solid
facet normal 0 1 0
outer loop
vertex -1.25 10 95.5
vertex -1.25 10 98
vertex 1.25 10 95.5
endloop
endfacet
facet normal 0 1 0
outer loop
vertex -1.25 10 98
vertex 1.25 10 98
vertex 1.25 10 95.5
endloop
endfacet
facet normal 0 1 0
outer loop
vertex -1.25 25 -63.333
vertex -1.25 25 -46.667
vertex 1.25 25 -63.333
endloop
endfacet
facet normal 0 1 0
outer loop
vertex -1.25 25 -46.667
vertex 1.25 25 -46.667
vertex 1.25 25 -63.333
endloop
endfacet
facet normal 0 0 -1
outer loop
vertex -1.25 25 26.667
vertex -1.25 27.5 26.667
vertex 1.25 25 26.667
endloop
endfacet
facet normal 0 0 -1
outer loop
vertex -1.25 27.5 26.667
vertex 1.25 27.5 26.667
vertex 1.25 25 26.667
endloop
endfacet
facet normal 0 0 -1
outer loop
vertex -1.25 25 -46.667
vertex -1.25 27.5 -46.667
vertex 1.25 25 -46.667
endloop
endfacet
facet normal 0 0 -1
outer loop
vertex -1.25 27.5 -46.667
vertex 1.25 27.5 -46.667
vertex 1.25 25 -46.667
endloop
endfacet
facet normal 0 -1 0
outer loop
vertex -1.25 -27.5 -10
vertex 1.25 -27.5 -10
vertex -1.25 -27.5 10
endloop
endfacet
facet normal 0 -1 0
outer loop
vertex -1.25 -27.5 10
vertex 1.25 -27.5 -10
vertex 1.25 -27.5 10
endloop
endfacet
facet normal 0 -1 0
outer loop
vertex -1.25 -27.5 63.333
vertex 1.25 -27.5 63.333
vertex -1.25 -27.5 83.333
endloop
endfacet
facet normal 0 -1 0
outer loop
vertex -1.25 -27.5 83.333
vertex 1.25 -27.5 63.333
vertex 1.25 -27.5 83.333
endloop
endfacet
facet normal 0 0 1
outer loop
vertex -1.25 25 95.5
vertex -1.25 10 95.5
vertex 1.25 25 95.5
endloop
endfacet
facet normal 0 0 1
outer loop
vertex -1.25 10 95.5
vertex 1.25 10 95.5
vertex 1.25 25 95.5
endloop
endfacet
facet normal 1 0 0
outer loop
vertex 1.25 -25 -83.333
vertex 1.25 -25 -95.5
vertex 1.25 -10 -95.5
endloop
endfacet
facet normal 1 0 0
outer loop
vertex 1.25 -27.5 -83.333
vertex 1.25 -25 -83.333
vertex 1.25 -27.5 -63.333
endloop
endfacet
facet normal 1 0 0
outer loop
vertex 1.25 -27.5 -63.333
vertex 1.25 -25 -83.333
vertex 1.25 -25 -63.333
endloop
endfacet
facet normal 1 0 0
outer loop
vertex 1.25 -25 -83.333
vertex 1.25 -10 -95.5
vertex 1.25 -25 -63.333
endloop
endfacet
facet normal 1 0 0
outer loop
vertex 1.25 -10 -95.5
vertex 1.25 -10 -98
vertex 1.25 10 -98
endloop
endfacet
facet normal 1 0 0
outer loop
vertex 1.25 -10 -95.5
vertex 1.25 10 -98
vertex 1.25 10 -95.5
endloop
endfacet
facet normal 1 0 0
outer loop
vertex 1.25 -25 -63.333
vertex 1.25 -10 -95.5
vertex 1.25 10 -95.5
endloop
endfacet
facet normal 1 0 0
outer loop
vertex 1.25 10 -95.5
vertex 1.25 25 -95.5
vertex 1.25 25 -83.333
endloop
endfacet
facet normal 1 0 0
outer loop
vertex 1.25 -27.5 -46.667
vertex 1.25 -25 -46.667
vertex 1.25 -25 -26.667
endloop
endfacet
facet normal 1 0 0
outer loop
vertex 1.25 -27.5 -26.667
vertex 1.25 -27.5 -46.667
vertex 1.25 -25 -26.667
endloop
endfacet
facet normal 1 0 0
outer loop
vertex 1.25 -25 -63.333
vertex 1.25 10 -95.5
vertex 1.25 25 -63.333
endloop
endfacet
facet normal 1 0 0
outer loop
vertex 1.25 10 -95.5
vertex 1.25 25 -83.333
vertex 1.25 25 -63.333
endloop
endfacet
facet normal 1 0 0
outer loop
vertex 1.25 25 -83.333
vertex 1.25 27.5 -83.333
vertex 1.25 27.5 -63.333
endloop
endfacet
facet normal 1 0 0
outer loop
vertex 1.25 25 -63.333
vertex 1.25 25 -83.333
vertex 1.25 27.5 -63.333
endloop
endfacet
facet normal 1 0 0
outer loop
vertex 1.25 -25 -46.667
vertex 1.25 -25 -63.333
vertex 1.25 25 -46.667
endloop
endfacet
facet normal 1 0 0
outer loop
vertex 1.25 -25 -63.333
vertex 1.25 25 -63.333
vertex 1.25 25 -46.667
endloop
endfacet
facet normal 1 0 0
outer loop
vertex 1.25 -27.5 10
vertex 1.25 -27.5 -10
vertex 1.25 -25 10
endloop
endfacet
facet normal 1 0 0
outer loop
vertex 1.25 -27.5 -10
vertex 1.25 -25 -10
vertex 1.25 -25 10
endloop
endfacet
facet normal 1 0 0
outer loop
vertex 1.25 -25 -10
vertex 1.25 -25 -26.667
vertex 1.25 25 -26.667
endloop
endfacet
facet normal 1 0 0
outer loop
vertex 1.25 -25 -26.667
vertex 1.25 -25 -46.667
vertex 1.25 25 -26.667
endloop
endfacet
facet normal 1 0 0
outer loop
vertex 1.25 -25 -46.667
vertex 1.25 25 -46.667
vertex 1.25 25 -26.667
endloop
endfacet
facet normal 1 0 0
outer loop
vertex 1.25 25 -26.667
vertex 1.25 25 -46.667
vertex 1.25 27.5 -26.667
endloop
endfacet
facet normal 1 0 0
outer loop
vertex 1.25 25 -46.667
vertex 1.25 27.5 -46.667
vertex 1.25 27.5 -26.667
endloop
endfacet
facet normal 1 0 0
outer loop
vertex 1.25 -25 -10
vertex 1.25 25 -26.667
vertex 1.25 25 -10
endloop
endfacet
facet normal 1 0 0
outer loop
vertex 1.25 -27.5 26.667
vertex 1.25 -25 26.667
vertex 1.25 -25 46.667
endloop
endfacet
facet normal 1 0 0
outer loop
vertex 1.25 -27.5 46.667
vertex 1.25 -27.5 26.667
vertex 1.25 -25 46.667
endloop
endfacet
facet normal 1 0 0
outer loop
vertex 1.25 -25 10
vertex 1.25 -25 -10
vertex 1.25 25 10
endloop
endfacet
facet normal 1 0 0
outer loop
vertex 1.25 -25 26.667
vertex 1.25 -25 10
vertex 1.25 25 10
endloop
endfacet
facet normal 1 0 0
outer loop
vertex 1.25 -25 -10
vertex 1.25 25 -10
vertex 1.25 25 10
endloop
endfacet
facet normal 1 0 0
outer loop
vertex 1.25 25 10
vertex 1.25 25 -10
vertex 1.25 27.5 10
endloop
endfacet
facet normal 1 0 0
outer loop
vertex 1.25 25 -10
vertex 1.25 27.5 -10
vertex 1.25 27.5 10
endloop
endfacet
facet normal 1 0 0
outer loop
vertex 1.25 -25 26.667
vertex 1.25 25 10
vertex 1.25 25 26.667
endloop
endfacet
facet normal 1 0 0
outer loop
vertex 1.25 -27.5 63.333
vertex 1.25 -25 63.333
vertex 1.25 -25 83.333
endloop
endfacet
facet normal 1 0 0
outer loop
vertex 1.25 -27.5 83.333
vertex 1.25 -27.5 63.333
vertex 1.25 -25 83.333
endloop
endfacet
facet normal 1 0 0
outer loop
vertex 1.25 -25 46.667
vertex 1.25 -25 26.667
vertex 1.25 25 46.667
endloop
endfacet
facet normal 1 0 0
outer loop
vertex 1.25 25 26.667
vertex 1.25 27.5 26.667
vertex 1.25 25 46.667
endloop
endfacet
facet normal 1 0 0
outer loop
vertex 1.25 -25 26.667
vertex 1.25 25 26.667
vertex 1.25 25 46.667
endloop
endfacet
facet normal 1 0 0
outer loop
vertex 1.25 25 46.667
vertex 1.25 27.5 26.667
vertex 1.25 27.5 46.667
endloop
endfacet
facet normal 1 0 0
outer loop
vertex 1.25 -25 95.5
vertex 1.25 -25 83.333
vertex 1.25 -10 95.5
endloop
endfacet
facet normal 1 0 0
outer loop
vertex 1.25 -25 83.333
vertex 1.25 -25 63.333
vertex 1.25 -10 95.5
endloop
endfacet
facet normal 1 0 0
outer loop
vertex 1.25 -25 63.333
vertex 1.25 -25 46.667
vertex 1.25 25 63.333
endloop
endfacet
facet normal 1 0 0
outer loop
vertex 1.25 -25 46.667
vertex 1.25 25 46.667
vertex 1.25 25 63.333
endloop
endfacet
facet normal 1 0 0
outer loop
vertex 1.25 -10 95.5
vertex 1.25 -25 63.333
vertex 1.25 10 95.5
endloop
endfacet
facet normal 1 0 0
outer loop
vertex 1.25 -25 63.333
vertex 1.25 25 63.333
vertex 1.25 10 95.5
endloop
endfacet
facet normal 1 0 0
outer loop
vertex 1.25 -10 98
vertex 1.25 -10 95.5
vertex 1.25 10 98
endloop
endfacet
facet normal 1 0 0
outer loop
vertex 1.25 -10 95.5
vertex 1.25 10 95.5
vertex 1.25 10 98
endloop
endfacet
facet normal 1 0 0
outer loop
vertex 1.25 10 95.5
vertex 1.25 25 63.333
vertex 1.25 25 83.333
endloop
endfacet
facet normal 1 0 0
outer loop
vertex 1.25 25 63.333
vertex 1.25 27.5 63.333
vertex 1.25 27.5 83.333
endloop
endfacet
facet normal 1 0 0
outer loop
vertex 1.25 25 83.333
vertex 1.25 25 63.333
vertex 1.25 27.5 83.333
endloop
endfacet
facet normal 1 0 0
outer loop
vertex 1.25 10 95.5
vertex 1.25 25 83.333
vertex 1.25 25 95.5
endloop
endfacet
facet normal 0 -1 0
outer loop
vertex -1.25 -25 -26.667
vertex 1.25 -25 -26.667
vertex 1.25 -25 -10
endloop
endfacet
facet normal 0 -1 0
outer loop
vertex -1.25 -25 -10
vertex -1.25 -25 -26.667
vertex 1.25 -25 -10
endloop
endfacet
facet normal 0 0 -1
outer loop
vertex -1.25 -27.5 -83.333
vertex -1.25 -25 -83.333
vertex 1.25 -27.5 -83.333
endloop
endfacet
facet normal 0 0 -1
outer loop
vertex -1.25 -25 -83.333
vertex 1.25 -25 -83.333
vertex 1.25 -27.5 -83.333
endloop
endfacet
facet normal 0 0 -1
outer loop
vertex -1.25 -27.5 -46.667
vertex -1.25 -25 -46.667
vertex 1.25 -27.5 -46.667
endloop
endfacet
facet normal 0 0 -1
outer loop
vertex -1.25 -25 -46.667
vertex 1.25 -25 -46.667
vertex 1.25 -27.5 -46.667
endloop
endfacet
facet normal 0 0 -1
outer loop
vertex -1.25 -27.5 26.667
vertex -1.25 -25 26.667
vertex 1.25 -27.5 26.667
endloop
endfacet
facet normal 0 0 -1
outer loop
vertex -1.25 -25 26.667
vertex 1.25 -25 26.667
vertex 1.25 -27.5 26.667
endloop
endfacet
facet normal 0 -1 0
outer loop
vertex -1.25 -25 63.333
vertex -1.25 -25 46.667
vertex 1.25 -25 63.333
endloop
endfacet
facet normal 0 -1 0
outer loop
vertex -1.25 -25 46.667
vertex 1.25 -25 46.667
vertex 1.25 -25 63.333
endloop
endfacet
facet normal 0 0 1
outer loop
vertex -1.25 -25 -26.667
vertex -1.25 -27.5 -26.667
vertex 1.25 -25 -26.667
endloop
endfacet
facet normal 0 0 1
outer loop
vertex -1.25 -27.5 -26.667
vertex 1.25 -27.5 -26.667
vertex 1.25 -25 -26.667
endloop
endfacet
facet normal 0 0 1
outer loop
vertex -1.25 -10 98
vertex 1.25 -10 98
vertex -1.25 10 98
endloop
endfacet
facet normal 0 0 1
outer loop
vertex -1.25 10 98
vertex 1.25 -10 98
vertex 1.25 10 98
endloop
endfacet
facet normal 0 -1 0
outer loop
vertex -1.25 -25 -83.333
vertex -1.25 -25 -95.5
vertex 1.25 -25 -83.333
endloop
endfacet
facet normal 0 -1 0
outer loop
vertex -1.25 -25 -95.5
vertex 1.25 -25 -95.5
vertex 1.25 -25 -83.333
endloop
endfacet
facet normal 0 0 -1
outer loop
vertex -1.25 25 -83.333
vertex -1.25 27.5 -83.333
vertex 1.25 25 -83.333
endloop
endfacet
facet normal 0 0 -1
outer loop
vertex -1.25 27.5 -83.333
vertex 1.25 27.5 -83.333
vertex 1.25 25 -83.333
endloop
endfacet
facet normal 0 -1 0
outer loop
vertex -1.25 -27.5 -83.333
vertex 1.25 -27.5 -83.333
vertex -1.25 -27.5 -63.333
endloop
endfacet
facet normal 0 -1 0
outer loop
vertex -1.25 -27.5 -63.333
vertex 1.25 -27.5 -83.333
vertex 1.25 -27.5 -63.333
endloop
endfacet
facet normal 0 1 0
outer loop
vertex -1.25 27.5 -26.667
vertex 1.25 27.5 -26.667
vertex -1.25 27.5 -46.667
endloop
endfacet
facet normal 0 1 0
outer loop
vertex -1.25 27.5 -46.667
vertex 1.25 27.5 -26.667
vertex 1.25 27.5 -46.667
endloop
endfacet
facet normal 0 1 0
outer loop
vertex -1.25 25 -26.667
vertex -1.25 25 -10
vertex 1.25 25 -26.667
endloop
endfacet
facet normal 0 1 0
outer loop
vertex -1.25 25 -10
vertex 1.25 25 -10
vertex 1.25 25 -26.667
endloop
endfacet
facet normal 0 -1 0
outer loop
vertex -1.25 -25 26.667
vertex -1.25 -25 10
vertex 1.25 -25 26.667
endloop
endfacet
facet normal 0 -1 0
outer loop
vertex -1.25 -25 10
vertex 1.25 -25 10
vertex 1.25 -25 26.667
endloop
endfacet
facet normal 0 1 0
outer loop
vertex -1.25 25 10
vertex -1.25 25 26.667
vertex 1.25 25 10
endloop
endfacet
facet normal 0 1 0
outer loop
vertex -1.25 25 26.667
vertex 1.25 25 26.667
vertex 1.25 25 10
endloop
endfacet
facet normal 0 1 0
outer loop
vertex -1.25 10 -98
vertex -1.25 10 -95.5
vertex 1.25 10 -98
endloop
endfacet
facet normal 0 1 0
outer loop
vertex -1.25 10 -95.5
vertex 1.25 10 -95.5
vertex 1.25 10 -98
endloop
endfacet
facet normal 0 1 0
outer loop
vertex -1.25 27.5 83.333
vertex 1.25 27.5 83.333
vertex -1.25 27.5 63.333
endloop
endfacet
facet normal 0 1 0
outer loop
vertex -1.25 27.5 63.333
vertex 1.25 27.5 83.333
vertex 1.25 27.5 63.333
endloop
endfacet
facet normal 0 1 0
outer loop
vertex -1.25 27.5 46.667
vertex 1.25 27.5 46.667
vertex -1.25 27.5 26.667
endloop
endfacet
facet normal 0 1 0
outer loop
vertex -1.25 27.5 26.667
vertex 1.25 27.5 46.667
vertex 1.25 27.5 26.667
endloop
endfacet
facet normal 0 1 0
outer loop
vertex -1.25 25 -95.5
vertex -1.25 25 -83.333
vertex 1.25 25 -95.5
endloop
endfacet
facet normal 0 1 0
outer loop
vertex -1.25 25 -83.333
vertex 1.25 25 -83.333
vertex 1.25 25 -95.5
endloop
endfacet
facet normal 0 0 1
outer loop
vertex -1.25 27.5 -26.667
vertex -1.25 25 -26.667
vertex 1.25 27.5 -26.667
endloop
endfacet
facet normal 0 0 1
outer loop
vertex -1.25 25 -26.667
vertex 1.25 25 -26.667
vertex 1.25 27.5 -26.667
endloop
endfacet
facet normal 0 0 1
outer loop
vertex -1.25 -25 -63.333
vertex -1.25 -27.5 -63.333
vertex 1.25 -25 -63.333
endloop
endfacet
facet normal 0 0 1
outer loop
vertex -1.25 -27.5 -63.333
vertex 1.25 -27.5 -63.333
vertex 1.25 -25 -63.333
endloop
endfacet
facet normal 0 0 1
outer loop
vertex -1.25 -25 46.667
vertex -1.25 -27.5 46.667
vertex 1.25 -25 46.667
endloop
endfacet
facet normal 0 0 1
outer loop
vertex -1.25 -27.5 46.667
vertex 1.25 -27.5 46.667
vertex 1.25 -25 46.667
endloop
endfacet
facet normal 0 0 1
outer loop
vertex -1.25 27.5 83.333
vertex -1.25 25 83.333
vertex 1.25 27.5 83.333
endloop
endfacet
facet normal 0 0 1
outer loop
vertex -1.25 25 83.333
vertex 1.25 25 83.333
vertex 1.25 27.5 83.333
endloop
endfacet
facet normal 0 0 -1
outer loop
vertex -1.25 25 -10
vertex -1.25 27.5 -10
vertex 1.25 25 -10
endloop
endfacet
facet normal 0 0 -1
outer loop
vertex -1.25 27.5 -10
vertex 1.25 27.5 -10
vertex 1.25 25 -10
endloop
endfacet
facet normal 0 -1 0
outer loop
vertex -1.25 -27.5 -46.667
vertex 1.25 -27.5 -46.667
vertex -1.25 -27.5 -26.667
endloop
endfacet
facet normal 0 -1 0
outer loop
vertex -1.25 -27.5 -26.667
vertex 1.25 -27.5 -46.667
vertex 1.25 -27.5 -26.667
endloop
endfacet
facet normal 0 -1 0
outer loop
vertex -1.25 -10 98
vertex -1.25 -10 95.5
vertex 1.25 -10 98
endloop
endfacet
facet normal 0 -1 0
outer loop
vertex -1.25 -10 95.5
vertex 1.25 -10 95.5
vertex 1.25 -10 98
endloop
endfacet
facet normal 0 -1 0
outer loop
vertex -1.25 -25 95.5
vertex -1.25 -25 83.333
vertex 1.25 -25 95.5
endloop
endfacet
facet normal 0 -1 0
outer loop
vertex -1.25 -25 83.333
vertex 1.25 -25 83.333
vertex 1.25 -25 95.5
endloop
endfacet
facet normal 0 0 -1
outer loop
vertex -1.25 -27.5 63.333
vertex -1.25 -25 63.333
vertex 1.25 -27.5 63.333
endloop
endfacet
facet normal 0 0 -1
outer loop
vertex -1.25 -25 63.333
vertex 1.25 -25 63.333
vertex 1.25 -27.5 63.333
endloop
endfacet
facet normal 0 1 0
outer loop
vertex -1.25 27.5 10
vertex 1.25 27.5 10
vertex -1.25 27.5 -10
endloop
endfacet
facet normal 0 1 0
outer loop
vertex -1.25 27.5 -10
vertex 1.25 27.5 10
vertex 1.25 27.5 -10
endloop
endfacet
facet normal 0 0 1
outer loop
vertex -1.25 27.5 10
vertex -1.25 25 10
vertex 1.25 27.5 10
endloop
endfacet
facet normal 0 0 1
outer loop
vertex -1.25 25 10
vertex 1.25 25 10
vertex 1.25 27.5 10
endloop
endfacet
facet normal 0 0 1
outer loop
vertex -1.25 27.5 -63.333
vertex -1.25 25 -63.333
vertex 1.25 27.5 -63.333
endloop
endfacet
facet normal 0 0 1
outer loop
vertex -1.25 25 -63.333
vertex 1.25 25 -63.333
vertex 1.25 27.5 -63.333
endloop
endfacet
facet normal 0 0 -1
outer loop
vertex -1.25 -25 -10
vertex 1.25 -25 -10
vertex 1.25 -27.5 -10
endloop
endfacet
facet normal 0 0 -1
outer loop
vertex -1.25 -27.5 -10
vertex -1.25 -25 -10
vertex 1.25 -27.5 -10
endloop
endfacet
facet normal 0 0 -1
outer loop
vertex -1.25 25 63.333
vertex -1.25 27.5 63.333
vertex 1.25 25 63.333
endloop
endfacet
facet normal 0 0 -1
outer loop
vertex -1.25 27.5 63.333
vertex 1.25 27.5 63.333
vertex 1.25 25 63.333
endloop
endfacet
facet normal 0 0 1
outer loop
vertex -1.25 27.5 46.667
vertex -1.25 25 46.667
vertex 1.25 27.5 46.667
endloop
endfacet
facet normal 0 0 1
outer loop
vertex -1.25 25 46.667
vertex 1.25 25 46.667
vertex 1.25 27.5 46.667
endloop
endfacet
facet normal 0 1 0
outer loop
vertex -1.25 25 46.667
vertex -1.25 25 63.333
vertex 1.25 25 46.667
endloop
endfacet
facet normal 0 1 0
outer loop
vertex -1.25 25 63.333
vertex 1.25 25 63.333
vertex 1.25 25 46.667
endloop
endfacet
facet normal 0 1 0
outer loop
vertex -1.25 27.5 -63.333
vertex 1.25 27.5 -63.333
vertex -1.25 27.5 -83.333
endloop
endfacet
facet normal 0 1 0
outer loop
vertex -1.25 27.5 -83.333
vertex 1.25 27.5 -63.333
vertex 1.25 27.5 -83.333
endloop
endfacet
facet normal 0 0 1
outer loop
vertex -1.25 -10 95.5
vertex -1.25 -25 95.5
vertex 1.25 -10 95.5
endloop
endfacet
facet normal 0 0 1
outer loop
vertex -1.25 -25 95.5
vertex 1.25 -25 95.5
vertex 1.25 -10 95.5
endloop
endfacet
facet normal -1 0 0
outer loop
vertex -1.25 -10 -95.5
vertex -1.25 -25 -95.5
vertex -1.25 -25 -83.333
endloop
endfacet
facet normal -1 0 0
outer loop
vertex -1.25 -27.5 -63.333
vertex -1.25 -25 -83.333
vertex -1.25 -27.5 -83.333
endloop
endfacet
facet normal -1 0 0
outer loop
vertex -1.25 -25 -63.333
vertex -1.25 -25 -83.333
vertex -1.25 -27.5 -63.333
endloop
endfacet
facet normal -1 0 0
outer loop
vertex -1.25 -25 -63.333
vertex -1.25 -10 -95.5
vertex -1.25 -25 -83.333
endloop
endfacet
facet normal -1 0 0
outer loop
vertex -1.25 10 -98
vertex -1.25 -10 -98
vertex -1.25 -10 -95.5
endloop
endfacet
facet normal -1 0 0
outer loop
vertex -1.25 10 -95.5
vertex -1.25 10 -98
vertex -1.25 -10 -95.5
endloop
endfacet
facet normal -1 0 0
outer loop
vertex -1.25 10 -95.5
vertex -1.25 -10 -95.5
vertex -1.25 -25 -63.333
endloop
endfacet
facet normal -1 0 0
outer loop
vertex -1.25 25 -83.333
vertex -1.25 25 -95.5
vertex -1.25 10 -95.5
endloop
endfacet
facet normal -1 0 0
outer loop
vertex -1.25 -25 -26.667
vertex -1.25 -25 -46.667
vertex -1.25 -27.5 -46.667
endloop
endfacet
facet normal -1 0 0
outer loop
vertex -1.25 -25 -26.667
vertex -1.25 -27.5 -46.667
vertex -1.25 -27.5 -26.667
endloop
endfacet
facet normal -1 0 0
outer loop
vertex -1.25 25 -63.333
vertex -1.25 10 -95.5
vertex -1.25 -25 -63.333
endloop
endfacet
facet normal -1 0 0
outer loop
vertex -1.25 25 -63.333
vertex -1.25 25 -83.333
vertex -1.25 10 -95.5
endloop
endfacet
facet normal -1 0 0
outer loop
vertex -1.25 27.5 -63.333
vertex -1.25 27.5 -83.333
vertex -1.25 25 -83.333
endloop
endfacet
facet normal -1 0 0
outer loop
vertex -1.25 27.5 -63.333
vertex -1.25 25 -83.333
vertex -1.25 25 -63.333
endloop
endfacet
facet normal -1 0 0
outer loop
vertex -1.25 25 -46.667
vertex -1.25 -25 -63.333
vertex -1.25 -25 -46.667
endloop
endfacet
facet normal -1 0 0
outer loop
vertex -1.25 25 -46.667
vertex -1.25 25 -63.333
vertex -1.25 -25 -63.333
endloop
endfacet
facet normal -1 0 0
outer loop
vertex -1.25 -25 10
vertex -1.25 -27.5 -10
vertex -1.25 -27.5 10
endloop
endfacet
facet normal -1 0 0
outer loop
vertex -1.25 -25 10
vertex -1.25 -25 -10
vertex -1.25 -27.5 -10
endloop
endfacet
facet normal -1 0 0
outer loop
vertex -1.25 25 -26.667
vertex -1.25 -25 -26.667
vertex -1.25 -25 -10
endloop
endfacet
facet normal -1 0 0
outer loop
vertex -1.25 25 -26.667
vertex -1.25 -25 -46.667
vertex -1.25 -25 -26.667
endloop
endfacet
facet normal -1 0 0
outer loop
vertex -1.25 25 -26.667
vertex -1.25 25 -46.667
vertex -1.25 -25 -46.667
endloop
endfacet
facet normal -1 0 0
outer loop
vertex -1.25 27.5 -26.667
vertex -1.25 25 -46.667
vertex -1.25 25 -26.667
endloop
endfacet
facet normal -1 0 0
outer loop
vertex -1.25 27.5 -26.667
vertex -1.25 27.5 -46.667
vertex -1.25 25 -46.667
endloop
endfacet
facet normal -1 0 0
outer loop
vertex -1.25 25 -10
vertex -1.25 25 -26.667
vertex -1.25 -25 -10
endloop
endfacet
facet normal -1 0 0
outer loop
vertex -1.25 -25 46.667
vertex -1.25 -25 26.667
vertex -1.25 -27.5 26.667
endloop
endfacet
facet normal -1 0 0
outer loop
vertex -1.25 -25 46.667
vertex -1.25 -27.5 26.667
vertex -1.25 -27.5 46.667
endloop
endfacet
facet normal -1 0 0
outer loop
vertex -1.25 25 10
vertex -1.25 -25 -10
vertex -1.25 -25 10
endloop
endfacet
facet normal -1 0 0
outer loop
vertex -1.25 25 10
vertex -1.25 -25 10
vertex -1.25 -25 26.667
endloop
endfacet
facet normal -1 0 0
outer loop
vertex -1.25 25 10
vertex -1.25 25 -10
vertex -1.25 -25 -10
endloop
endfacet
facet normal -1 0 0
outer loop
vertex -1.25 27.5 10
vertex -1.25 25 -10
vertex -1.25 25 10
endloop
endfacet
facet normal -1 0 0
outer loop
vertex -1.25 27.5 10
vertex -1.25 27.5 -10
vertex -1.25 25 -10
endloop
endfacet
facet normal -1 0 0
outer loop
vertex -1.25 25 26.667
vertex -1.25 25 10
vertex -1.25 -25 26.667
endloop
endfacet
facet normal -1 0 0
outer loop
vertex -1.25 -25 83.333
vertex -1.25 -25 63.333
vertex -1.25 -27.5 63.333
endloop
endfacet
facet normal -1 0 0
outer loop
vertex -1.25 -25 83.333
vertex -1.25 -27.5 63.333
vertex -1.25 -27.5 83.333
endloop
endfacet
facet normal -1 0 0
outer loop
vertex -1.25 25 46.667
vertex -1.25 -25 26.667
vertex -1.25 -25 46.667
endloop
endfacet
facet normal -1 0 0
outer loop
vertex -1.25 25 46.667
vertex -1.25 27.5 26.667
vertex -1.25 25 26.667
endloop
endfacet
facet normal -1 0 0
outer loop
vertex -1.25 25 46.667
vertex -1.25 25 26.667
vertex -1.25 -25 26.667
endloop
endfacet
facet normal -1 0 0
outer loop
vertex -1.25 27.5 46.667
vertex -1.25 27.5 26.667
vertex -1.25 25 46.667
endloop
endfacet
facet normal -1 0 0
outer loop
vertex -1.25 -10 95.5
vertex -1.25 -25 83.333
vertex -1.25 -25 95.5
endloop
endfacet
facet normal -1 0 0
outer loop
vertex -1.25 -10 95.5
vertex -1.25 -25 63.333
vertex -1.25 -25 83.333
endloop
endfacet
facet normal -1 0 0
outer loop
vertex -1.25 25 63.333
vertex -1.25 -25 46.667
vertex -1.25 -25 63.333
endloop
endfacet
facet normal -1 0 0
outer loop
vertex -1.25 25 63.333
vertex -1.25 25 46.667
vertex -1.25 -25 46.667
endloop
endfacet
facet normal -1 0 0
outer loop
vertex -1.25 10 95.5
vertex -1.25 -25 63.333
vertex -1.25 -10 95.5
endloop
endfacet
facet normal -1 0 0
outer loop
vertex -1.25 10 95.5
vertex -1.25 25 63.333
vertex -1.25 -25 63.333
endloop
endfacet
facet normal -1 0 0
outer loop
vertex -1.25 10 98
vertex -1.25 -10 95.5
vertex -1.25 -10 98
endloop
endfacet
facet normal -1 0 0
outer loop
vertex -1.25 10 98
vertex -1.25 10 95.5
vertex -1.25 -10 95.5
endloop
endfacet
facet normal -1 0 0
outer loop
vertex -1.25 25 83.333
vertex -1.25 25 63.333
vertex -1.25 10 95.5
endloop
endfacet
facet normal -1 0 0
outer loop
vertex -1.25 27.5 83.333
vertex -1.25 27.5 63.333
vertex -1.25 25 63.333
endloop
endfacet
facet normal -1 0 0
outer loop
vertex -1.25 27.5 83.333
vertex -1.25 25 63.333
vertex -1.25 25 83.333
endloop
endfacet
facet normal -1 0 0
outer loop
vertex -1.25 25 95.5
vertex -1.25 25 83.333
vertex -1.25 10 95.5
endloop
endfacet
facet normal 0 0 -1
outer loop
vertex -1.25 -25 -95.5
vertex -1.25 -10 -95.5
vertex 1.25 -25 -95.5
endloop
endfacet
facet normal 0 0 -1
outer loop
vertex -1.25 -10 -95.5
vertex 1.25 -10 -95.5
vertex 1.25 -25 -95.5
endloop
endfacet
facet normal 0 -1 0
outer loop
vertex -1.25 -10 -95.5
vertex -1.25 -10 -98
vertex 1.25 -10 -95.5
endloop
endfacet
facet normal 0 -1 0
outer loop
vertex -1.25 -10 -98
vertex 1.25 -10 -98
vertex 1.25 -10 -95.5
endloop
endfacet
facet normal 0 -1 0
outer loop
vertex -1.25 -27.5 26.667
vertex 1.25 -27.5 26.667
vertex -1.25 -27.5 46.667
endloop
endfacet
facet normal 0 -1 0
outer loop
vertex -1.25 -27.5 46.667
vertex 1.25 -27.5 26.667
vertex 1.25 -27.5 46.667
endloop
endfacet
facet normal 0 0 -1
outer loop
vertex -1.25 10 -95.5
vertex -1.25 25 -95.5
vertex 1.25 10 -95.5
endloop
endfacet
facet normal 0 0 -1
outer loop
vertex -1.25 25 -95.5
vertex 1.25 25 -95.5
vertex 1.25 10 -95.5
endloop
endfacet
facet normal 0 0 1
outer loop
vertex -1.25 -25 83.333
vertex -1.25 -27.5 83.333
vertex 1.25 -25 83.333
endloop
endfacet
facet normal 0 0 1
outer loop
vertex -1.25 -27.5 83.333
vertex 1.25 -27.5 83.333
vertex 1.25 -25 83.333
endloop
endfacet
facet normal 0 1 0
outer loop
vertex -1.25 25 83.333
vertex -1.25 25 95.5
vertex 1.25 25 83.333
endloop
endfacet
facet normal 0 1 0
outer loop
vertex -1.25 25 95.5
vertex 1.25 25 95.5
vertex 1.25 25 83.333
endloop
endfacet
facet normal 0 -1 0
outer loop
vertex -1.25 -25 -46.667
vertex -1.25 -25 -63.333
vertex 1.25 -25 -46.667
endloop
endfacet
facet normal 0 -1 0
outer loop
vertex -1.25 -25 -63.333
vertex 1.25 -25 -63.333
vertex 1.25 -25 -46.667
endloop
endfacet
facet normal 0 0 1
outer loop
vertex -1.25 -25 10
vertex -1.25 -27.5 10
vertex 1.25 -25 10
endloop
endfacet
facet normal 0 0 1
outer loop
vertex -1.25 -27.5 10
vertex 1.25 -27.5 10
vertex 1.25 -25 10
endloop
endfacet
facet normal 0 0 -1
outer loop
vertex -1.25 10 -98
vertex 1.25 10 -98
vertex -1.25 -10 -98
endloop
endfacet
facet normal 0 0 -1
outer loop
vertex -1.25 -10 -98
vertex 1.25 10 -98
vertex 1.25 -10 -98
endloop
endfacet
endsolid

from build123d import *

# Parameters (mm, degrees)
BOSS_EXTRUDE1_DEPTH = 1.25


with BuildPart() as part:
    # Sketch1 → Boss-Extrude1 (new, symmetric)
    with BuildSketch(Plane(origin=(0, 0, 0), x_dir=(0, 0, -1), z_dir=(1, 0, 0))):
        Polygon((10, -27.5), (-10, -27.5), (-10, -25), (-26.666666667, -25), (-26.666666667, -27.5), (-46.666666667, -27.5), (-46.666666667, -25), (-63.333333333, -25), (-63.333333333, -27.5), (-83.333333333, -27.5), (-83.333333333, -25), (-95.5, -25), (-95.5, -10), (-98, -10), (-98, 10), (-95.5, 10), (-95.5, 25), (-83.333333333, 25), (-83.333333333, 27.5), (-63.333333333, 27.5), (-63.333333333, 25), (-46.666666667, 25), (-46.666666667, 27.5), (-26.666666667, 27.5), (-26.666666667, 25), (-10, 25), (-10, 27.5), (10, 27.5), (10, 25), (26.666666667, 25), (26.666666667, 27.5), (46.666666667, 27.5), (46.666666667, 25), (63.333333333, 25), (63.333333333, 27.5), (83.333333333, 27.5), (83.333333333, 25), (95.5, 25), (95.5, 10), (98, 10), (98, -10), (95.5, -10), (95.5, -25), (83.333333333, -25), (83.333333333, -27.5), (63.333333333, -27.5), (63.333333333, -25), (46.666666667, -25), (46.666666667, -27.5), (26.666666667, -27.5), (26.666666667, -25), (10, -25), align=None)
    extrude(amount=BOSS_EXTRUDE1_DEPTH, both=True)


solid = part.part
